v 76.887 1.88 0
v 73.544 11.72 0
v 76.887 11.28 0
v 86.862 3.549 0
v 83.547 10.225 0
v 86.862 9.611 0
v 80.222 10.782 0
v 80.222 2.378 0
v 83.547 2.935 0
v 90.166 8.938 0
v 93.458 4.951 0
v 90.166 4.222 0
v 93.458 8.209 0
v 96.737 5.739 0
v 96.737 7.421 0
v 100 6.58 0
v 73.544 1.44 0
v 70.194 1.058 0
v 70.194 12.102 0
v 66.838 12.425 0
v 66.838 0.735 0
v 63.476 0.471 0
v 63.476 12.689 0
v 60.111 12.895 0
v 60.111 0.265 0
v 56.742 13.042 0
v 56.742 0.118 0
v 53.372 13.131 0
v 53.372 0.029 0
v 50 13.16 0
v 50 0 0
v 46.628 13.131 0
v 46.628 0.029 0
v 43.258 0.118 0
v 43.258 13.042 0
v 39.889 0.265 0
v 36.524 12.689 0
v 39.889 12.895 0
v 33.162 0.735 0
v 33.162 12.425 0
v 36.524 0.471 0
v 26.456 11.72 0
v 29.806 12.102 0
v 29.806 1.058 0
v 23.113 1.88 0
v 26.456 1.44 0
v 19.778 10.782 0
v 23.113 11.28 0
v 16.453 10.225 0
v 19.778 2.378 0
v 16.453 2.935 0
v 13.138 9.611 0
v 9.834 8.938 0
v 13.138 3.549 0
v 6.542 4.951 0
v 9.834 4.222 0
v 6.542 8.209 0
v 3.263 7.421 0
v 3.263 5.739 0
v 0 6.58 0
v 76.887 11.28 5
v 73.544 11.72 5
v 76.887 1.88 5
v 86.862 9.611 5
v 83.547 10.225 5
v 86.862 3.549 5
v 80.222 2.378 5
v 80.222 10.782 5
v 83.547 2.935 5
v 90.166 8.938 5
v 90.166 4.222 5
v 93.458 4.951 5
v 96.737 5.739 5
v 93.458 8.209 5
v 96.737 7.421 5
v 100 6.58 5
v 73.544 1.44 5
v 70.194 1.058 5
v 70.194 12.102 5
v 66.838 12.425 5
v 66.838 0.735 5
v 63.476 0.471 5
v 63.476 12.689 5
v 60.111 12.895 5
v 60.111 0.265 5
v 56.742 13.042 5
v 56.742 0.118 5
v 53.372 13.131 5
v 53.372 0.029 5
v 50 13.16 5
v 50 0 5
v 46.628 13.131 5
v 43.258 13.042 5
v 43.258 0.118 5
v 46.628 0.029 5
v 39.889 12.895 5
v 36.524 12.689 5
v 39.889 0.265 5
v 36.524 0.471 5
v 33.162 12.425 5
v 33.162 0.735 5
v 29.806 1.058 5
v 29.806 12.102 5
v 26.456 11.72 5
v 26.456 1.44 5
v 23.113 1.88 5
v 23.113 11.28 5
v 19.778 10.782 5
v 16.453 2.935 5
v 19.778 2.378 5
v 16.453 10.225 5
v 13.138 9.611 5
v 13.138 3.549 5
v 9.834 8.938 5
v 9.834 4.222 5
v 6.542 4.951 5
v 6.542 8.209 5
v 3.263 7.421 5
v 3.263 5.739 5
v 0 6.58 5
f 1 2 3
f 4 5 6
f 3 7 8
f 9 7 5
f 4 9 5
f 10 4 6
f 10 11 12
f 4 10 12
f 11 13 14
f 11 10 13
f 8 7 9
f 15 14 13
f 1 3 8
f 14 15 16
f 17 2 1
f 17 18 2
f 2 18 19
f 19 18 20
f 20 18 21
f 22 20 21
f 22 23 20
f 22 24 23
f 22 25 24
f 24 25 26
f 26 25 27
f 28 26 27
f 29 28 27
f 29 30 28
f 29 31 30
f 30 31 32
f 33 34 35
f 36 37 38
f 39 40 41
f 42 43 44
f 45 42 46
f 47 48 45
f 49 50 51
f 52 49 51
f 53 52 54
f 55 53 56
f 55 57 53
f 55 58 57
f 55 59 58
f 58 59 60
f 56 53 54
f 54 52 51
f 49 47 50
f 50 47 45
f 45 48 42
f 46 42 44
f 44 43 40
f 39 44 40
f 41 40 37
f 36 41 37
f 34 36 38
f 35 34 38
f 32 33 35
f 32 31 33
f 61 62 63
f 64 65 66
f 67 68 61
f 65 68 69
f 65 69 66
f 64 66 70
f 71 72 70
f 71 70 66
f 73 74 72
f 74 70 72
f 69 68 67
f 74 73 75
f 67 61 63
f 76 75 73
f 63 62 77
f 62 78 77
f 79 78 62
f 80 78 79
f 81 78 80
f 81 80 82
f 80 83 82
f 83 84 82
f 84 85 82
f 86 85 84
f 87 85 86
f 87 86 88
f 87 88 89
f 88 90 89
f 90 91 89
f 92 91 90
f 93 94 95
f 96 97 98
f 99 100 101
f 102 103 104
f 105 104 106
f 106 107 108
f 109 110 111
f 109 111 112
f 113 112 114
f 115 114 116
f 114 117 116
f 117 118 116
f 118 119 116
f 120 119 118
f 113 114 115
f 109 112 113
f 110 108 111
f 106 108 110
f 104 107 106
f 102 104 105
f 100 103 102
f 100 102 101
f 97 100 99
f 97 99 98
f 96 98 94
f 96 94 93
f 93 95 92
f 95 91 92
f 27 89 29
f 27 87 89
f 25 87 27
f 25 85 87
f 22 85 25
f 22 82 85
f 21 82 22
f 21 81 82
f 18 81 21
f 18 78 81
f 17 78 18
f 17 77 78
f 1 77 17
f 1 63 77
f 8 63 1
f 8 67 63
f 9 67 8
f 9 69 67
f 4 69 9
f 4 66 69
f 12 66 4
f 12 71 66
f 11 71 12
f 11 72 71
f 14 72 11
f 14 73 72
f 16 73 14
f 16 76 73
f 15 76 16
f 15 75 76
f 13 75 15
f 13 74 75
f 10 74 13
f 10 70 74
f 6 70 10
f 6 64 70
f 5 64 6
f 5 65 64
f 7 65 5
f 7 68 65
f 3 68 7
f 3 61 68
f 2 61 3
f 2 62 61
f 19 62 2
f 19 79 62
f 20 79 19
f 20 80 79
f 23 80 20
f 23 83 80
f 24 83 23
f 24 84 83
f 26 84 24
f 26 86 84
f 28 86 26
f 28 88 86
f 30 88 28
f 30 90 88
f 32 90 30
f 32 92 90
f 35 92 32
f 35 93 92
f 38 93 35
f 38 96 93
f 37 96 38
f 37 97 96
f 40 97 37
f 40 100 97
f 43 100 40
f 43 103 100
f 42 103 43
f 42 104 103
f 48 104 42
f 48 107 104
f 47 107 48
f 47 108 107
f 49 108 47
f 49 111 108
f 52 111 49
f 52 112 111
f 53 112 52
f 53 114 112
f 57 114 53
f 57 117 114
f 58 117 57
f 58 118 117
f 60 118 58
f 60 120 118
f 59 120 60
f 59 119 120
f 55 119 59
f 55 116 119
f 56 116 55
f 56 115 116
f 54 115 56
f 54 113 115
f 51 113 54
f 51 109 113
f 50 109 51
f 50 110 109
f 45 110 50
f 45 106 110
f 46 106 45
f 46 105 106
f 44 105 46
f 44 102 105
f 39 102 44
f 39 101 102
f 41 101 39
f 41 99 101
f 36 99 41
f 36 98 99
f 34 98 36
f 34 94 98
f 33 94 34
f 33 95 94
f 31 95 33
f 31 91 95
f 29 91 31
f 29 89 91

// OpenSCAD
$fn = 32;

// ----------------------------------------------------------------------
// Arc profile plate: lens, 60 points
// ----------------------------------------------------------------------

// --- parameters (mm) ---
lens_chord = 100;         // chord length of the lens, X
arc_r = 193.19;           // radius of both arcs
arc_angle = 30;           // angle of each arc, degrees
sagitta = 6.58;           // bulge of each arc (half the lens height)
arc_step = 1;             // sampling step of the arcs, degrees
plate_t = 5;              // plate thickness, Z

bbox_y = 2 * sagitta;  // full lens height

profile = [[100, 6.58], [96.737, 7.421], [93.458, 8.209], [90.166, 8.938], [86.862, 9.611], [83.547, 10.225], [80.222, 10.782], [76.887, 11.28], [73.544, 11.72], [70.194, 12.102], [66.838, 12.425], [63.476, 12.689], [60.111, 12.895], [56.742, 13.042], [53.372, 13.131], [50, 13.16], [46.628, 13.131], [43.258, 13.042], [39.889, 12.895], [36.524, 12.689], [33.162, 12.425], [29.806, 12.102], [26.456, 11.72], [23.113, 11.28], [19.778, 10.782], [16.453, 10.225], [13.138, 9.611], [9.834, 8.938], [6.542, 8.209], [3.263, 7.421], [0, 6.58], [3.263, 5.739], [6.542, 4.951], [9.834, 4.222], [13.138, 3.549], [16.453, 2.935], [19.778, 2.378], [23.113, 1.88], [26.456, 1.44], [29.806, 1.058], [33.162, 0.735], [36.524, 0.471], [39.889, 0.265], [43.258, 0.118], [46.628, 0.029], [50, 0], [53.372, 0.029], [56.742, 0.118], [60.111, 0.265], [63.476, 0.471], [66.838, 0.735], [70.194, 1.058], [73.544, 1.44], [76.887, 1.88], [80.222, 2.378], [83.547, 2.935], [86.862, 3.549], [90.166, 4.222], [93.458, 4.951], [96.737, 5.739]];  // primary outline, 60 points, counter clockwise

// --- the one profile operation ---
linear_extrude(height = plate_t) polygon(points = profile);
